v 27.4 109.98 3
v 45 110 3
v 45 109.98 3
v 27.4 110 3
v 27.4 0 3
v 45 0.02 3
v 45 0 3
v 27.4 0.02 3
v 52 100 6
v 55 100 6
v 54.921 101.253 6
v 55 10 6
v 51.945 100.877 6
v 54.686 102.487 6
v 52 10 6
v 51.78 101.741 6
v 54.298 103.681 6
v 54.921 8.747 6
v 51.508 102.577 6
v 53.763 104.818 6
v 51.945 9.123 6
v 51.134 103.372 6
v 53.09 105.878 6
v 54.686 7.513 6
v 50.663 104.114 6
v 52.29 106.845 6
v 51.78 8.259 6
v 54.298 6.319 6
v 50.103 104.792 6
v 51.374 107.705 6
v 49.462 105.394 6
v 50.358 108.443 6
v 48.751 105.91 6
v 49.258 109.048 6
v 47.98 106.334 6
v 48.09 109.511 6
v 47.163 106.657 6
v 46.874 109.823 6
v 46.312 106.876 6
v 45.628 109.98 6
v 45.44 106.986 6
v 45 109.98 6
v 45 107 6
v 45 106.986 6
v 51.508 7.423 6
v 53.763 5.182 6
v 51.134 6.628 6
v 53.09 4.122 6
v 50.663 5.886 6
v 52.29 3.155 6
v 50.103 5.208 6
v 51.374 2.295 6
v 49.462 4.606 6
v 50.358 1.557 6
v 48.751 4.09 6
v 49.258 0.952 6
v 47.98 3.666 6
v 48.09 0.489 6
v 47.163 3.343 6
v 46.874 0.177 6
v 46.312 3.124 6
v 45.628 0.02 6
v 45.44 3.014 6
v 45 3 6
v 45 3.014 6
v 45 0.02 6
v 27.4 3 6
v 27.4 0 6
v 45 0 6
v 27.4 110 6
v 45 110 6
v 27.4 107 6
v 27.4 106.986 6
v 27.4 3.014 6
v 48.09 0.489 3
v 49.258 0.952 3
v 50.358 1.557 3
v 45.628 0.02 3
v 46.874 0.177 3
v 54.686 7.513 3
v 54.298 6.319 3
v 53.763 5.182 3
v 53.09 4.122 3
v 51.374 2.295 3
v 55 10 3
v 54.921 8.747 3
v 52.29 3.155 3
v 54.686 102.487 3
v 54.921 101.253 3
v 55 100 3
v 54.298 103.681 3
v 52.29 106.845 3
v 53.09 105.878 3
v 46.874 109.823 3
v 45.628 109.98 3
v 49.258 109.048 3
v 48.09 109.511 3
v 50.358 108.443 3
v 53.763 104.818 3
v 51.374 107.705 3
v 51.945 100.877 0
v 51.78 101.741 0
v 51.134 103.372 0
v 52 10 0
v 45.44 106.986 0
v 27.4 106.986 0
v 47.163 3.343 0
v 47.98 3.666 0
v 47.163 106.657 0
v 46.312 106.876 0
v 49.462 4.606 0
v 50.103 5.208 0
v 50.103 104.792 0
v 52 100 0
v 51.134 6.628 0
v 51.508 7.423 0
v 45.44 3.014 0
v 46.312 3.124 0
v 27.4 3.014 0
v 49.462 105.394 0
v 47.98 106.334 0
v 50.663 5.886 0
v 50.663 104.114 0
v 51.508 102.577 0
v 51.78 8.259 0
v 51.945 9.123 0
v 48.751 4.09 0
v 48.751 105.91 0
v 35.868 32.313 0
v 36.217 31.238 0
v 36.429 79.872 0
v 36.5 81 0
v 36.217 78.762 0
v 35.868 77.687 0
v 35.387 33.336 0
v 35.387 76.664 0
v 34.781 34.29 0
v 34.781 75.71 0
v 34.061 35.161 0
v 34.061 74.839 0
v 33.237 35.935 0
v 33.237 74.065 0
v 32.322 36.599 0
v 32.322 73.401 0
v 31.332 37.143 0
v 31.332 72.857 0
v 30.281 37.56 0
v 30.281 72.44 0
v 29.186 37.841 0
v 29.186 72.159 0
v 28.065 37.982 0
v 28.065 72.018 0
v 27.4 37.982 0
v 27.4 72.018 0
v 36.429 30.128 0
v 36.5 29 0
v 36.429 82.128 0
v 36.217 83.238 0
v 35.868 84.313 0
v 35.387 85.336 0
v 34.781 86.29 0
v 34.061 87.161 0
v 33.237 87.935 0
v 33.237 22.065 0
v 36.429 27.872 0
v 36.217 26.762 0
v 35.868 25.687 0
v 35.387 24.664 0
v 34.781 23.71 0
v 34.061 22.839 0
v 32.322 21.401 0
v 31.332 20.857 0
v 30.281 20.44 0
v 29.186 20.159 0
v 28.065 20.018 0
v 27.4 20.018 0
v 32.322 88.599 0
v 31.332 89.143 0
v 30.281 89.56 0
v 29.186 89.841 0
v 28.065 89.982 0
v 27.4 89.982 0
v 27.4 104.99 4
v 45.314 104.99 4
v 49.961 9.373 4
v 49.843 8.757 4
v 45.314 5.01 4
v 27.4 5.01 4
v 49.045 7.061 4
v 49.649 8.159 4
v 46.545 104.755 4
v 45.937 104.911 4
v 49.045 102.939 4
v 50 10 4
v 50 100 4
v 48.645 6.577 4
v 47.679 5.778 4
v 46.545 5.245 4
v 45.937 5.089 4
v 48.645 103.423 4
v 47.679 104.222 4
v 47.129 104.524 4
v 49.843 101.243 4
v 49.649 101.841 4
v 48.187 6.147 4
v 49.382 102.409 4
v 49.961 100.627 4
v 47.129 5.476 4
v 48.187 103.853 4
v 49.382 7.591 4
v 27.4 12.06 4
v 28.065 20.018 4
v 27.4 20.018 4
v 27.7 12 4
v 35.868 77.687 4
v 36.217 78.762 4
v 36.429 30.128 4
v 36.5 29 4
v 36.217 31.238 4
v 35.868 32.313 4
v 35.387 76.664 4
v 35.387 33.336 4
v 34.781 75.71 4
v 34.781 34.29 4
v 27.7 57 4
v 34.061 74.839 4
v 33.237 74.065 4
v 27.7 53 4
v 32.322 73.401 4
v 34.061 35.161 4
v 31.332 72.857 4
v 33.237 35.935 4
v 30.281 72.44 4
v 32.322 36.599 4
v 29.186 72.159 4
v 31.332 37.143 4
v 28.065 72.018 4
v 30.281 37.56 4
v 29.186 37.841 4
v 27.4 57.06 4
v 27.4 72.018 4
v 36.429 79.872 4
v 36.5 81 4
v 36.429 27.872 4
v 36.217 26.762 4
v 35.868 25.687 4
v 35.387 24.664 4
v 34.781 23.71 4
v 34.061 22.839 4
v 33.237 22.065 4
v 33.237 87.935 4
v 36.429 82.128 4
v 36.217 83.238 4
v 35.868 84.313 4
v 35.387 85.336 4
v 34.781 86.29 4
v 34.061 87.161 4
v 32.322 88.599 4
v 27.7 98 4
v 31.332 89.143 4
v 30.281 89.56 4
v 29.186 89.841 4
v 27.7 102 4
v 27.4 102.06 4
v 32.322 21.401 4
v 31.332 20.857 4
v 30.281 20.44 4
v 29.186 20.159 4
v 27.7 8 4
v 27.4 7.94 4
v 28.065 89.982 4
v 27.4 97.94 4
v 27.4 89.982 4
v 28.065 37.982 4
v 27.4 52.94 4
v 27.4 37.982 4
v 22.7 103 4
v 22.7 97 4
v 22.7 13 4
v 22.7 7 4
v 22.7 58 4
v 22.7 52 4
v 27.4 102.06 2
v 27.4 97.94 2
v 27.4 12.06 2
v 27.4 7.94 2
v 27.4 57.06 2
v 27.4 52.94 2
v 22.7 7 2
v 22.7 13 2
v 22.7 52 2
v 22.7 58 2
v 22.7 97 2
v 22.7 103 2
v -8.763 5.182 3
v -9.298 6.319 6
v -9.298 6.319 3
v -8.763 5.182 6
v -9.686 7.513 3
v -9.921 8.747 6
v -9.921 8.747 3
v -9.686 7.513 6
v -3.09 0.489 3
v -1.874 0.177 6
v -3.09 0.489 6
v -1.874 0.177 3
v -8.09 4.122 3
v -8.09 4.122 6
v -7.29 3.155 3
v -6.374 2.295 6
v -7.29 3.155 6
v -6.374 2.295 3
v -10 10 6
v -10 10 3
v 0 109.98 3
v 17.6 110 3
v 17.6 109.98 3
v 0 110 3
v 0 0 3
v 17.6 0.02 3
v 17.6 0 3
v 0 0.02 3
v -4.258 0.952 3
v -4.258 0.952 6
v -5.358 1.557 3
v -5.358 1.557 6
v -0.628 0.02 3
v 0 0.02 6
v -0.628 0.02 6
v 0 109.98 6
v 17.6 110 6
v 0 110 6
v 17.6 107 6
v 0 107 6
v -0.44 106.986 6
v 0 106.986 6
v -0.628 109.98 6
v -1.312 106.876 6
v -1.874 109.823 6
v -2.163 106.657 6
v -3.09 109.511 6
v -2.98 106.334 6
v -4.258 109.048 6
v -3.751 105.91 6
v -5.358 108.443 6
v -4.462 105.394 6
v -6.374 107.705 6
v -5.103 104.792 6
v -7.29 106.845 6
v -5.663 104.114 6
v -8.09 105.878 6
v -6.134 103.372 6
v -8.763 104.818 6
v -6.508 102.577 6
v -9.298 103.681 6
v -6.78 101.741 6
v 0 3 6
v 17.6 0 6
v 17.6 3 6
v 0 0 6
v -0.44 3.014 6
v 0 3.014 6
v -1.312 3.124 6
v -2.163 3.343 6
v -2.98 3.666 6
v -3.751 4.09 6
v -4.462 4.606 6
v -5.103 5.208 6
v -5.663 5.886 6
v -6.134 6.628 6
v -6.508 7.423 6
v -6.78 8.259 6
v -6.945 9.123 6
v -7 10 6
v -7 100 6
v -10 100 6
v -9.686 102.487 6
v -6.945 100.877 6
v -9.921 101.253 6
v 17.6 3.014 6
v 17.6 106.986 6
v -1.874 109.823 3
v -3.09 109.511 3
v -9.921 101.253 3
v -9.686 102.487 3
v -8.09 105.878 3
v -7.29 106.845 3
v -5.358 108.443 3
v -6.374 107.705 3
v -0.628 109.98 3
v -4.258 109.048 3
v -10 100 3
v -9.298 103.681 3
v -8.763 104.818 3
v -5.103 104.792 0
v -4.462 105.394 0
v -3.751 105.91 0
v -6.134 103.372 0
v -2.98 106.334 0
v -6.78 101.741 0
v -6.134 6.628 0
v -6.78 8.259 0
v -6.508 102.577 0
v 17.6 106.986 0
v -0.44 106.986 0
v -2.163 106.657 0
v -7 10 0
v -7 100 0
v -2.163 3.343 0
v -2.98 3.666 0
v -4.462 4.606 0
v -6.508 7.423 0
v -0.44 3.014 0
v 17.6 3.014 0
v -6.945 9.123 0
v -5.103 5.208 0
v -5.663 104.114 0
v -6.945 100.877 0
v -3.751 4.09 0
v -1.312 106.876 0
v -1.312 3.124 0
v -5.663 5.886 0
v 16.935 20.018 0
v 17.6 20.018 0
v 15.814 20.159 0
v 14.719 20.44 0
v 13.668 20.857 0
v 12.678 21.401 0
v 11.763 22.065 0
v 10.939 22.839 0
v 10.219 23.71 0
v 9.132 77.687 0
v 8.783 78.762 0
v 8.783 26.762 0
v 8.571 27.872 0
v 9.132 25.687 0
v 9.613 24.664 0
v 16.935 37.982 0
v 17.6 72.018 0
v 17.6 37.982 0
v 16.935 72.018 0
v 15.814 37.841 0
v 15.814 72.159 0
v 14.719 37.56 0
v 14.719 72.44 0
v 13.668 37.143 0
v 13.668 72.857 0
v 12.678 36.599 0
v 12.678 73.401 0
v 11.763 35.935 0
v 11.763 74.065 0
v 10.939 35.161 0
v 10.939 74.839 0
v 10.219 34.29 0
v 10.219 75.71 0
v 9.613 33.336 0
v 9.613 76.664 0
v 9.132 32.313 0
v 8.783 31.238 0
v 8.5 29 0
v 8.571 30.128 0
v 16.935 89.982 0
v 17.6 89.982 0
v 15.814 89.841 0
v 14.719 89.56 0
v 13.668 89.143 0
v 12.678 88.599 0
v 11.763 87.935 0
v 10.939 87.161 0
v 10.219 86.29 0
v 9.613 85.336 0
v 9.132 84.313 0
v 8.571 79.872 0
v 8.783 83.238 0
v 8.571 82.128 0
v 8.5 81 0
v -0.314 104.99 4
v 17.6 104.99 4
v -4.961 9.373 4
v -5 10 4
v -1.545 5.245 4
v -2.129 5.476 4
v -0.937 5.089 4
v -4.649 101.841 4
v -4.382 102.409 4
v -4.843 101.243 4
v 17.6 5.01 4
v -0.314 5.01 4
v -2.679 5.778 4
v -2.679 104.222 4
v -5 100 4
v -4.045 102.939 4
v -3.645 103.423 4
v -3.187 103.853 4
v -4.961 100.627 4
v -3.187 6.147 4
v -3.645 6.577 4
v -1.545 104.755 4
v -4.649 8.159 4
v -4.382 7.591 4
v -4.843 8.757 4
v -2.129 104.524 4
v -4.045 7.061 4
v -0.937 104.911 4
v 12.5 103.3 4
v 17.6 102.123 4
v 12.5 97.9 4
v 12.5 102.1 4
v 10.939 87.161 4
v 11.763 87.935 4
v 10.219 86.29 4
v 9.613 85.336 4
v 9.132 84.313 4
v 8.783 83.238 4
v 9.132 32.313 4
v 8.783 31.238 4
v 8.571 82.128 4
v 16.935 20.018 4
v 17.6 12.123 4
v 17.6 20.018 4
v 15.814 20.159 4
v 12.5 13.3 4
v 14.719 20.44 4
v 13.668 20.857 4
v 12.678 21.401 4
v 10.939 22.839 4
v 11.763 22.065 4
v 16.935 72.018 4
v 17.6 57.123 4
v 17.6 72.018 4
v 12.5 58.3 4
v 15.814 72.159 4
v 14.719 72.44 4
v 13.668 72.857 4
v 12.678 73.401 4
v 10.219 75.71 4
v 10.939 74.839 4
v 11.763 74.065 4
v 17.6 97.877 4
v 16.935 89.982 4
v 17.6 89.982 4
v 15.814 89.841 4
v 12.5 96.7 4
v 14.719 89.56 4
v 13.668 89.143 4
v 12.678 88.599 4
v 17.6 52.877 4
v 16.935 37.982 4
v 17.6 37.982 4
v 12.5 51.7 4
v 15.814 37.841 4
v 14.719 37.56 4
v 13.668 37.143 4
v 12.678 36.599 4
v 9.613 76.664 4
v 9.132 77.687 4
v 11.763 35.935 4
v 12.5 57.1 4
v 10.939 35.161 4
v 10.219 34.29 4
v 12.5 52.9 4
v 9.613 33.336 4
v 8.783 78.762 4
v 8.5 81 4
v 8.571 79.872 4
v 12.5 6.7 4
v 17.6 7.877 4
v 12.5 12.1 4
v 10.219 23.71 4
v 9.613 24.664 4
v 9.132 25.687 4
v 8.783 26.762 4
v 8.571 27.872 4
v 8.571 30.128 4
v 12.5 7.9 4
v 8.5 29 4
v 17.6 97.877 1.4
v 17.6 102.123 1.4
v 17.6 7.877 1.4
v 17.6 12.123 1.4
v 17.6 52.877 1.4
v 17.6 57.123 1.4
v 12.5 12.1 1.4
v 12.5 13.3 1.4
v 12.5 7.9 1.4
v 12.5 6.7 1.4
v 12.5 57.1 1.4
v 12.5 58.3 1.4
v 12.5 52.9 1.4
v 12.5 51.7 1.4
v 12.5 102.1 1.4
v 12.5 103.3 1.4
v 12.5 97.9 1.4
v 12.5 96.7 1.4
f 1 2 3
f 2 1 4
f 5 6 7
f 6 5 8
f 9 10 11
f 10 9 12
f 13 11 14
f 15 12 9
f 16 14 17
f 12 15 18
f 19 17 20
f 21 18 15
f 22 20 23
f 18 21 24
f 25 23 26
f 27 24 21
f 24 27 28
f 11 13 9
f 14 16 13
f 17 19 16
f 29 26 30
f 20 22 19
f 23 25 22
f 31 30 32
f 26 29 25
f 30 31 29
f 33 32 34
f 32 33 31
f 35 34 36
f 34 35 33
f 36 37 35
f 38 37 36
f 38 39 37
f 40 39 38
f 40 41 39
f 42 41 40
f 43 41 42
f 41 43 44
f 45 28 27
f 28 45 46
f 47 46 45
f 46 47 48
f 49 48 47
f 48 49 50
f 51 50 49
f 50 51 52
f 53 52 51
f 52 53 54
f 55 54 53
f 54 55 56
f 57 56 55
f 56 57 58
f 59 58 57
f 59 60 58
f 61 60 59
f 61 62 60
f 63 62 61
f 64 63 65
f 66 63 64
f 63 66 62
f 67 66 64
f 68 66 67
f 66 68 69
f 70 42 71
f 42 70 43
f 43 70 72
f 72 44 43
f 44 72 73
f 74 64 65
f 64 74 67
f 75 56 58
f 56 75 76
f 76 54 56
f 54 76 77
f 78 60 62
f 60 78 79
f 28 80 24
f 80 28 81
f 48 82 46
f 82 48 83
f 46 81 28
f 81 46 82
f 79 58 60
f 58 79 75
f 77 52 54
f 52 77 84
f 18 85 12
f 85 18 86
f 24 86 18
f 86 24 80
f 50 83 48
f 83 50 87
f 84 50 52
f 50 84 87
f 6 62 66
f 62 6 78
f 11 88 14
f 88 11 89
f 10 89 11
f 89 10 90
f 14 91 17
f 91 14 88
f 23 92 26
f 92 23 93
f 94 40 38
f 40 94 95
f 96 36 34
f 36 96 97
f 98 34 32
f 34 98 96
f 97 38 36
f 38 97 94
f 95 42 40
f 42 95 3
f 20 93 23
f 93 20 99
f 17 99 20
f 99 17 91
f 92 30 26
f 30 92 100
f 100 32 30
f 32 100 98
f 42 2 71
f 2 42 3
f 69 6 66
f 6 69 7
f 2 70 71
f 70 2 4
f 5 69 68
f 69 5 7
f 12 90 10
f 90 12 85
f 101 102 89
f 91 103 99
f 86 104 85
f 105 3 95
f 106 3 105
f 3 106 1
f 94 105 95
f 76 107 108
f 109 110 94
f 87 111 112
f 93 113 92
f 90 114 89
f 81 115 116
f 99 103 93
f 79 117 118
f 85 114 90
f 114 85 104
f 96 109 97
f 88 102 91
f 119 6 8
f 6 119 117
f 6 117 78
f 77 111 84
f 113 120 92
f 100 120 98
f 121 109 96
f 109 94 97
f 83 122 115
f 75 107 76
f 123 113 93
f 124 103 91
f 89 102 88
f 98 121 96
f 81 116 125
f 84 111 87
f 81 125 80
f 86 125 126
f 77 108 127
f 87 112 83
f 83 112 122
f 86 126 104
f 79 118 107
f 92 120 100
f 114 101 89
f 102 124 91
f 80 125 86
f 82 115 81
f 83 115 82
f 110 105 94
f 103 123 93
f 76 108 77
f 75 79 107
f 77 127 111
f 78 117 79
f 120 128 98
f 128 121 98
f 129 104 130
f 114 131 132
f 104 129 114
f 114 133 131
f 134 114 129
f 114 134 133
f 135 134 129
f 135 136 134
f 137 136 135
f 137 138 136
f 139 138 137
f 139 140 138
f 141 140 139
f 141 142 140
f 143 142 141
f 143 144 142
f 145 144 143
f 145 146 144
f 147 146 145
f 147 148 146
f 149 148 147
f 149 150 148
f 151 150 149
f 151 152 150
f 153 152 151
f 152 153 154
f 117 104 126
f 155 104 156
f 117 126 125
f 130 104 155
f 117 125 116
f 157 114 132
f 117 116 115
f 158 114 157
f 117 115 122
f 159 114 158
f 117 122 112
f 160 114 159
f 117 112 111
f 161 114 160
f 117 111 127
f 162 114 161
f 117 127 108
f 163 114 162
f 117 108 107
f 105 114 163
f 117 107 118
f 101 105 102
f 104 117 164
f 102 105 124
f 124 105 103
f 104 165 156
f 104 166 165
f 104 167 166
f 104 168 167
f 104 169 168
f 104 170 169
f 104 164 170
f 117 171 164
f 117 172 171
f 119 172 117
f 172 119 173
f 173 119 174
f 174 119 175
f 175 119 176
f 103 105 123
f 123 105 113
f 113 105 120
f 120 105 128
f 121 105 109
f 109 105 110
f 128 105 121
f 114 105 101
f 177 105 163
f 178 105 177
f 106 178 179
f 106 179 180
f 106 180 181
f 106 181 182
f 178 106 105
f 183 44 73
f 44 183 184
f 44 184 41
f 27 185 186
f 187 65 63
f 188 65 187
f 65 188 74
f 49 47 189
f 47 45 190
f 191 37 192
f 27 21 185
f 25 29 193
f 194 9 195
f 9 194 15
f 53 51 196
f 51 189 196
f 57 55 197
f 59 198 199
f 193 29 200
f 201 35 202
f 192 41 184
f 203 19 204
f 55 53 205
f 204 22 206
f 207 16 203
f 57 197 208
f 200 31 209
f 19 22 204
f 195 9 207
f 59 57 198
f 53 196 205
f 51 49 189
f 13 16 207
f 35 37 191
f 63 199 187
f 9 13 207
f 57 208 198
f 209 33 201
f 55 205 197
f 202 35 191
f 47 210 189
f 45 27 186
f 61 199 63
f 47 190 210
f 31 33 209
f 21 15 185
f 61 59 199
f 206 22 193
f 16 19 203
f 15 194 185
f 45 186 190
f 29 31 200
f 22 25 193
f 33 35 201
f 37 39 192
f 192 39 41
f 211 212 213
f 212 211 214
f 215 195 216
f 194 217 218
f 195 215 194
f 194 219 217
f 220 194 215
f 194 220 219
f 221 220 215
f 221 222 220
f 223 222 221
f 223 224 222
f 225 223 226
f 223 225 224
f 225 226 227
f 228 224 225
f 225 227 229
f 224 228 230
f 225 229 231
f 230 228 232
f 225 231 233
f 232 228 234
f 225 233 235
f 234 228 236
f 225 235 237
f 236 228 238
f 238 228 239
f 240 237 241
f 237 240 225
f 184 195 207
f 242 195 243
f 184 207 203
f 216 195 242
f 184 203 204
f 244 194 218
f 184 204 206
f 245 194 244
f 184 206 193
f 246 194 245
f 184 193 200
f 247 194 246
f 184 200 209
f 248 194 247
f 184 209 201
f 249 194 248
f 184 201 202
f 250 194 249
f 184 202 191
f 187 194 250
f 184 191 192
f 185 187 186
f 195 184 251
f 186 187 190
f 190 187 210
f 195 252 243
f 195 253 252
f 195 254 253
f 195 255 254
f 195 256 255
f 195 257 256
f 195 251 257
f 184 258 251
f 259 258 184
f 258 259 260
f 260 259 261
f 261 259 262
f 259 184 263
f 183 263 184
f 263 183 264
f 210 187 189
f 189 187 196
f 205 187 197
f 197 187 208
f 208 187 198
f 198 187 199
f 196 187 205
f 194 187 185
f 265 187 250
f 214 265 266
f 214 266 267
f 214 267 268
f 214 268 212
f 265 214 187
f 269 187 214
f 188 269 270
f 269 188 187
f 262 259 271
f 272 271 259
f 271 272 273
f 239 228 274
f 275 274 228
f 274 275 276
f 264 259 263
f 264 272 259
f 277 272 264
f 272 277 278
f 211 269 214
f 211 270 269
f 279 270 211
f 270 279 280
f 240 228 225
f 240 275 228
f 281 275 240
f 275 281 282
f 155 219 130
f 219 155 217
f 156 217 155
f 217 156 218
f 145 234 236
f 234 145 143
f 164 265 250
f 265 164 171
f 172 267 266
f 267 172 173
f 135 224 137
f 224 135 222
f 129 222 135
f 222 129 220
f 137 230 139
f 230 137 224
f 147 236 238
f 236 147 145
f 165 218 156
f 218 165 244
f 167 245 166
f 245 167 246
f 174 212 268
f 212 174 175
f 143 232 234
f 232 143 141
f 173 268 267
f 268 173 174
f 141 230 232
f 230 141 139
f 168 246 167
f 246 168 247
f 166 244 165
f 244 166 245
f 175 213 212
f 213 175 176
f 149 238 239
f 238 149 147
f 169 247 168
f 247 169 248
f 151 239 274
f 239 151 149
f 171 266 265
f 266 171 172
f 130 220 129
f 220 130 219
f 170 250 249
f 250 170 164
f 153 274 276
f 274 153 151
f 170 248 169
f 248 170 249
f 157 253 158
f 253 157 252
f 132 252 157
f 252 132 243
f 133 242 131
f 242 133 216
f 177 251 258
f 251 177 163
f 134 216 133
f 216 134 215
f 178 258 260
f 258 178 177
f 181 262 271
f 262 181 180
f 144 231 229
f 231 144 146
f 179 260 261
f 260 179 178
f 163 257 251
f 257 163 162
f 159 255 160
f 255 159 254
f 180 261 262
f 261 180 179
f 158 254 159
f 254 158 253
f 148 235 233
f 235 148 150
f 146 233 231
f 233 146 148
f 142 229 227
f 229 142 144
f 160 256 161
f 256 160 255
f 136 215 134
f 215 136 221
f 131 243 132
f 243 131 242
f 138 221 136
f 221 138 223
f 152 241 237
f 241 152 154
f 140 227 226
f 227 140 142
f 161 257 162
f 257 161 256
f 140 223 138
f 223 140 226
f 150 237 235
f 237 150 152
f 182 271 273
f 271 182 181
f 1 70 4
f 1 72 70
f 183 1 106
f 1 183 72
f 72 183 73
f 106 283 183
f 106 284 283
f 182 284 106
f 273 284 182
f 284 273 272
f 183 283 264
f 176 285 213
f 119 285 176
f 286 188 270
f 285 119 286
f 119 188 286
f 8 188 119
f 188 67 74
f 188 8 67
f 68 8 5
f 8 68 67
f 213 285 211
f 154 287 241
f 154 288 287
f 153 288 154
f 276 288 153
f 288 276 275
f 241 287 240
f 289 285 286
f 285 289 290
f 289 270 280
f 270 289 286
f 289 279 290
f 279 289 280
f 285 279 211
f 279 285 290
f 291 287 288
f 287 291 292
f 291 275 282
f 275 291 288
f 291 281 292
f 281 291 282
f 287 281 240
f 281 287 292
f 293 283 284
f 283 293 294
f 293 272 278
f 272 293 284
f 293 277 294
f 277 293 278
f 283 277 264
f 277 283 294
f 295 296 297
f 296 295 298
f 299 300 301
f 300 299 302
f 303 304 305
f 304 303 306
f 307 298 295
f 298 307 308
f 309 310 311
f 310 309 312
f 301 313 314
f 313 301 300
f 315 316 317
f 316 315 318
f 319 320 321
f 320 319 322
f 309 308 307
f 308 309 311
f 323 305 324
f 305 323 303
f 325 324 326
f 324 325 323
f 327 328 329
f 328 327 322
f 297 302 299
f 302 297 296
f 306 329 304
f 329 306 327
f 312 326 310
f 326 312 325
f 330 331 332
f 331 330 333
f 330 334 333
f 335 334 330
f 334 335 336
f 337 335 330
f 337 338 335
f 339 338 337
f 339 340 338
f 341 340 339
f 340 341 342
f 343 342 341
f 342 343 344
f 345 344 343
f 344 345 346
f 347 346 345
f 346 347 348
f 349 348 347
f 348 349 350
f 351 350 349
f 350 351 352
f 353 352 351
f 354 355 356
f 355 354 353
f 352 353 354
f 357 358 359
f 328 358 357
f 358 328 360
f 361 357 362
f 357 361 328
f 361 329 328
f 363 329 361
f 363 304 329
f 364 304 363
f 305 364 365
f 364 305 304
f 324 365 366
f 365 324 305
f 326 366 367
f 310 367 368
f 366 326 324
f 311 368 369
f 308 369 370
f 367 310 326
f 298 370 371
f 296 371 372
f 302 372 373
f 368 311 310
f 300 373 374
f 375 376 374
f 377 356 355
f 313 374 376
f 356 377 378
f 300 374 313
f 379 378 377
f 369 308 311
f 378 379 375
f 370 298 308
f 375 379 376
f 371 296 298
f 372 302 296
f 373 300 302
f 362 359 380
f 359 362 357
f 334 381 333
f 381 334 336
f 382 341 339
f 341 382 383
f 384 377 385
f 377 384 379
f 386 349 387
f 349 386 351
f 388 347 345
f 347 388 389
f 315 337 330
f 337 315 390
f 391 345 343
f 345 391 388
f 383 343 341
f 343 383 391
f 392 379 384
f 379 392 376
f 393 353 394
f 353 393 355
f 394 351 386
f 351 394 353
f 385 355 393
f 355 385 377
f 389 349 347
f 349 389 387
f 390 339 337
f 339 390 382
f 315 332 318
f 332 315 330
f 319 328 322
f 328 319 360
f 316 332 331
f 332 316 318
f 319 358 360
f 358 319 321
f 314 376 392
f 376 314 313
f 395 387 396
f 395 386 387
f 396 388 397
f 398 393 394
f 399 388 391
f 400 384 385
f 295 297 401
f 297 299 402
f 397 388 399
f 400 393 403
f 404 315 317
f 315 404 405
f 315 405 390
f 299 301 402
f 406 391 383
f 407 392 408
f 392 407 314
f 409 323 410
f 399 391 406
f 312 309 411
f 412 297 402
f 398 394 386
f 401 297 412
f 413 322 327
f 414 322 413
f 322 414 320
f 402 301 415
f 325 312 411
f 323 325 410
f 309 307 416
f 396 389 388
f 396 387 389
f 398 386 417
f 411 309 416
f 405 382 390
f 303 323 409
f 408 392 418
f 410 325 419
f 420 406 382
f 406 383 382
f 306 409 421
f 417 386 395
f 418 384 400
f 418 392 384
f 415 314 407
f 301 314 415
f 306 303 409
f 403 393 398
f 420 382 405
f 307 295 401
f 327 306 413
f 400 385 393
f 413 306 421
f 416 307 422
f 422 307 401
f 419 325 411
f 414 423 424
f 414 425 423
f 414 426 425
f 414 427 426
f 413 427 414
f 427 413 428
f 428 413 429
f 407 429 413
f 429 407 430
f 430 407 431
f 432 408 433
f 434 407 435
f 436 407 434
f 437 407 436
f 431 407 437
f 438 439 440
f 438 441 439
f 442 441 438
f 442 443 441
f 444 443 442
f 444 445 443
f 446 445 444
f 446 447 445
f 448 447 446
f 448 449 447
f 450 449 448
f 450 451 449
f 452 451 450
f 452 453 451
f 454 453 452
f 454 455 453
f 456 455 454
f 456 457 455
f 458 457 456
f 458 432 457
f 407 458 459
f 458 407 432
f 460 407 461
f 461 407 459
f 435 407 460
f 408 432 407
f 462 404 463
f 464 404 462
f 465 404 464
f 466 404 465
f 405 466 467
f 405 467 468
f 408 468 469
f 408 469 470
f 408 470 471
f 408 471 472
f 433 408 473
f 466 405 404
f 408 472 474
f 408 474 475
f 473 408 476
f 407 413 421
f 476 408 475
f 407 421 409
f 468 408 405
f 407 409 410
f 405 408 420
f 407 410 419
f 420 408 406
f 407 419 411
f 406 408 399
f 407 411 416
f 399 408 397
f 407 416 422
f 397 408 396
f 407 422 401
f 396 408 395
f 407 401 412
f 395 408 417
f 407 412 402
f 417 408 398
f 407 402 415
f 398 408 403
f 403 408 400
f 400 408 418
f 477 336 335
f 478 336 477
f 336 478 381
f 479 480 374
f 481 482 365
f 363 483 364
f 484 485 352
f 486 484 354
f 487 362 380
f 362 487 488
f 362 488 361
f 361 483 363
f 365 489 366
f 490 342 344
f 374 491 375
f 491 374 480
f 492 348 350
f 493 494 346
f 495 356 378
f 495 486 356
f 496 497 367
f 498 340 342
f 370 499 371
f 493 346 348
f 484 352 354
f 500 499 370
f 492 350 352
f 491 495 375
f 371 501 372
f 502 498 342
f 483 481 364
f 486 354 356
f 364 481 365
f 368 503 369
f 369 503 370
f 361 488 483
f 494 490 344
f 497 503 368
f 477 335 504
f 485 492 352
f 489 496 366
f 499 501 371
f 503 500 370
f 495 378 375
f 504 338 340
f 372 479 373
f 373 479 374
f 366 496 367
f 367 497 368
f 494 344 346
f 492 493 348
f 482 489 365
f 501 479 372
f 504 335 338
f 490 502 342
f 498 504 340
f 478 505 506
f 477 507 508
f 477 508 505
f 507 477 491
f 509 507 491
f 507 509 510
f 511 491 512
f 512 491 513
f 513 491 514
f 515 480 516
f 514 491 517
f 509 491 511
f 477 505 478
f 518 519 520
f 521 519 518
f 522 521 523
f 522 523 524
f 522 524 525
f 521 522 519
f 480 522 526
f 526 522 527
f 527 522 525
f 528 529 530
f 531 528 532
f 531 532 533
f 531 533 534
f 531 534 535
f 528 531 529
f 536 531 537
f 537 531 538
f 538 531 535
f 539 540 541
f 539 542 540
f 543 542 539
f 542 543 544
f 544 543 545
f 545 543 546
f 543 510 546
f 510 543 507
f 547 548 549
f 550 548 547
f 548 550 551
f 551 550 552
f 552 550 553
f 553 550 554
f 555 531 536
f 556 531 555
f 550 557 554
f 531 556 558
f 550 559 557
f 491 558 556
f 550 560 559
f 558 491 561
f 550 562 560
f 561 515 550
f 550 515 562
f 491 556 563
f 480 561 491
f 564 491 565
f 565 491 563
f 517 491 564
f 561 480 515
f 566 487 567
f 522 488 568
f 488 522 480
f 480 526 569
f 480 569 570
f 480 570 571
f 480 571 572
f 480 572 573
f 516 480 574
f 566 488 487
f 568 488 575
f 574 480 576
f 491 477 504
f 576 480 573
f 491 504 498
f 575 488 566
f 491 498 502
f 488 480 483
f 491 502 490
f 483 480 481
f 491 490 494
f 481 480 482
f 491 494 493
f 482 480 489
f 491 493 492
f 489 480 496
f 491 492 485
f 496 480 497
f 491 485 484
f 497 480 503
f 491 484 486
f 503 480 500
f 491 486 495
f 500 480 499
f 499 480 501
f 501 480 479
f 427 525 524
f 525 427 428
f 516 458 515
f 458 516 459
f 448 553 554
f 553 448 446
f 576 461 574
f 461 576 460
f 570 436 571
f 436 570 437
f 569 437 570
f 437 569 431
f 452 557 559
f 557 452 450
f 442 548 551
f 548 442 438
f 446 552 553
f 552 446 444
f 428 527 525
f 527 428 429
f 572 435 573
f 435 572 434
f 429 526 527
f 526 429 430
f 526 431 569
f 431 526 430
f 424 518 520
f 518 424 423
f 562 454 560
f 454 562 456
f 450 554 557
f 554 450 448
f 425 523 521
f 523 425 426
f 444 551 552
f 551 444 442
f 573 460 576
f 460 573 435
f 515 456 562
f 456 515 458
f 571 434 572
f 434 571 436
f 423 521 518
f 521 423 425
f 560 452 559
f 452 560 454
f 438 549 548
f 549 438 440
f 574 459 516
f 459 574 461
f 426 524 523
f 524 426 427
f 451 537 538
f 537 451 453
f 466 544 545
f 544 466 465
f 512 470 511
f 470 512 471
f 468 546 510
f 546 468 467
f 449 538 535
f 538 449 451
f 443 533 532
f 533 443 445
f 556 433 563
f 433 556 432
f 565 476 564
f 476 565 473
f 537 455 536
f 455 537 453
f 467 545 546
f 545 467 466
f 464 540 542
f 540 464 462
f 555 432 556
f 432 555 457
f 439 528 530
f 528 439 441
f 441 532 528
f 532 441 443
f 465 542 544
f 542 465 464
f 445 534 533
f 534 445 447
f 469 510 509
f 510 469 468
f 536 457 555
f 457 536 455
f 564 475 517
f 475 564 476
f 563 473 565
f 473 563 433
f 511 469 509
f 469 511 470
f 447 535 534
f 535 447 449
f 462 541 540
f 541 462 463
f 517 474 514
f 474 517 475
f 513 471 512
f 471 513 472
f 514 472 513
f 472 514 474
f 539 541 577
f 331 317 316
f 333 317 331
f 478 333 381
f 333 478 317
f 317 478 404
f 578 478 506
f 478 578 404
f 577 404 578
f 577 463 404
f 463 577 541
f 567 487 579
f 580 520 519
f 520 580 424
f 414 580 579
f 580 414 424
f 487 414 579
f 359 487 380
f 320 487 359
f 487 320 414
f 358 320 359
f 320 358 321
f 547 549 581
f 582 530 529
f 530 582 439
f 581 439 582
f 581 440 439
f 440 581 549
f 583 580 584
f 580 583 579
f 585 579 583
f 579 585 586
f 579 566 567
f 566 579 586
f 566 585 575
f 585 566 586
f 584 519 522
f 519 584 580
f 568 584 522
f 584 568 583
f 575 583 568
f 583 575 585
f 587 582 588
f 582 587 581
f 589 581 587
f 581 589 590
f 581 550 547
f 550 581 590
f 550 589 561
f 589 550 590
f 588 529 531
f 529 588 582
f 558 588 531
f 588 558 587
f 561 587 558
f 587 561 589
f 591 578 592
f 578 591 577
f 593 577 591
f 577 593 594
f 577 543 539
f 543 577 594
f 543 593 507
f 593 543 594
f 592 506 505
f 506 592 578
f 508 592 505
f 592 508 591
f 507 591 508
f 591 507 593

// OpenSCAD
// file: toilet_ground_floor_config.scad
use <./_cfg.scad>

// Toilet Ground Floor Configuration Functions
function get_h() = 6;
function get_width() = 55;
function get_length() = 110;
function get_diameter() = 18;
function get_distance() = 52;
function get_nutDistance() = 10;
function get_separation() = 10;
function get_offset_l() = 0;
function get_offset_r() = 0;
// file: _cfg.scad
// Global configuration functions
function get_fn() = 50;
function get_darft() = false;
// file: base.scad
module base(h, width, length, diameter, distance, offset_l=0, offset_r=0, fn) {
    corner_radius=10;

    difference() {
        union() {
            difference() {
                _base_plate_shape(corner_radius, h, width, length, fn);
                translate([3,3,h-2]) {
                    offset=3;
                    _base_plate_shape(corner_radius-offset, h-2, width-offset*2, length-offset*2, fn);
                }
            }
        }

        translate([width/2, length/2-distance/2, -.1]) {
            translate([offset_l, 0, 0])
            cylinder(d=diameter, h=h+.2, center=false, $fn=fn);
            translate([offset_r, distance, 0]) {
                cylinder(d=diameter, h=h+.2, center=false, $fn=fn);
            }
        }
    }
}

module rounded_top_only(corner_radius, h, width, length, fn) {
    minkowski() {
        _base_plate_shape(corner_radius, h - corner_radius, width, length, fn);
        translate([0, 0, corner_radius]) cylinder(r=corner_radius/2, h=0.001, $fn=fn);
    }
}

module _base_plate_shape(corner_radius, h, width, length, fn) {
    hs=h/2;
    hn=h-hs;

    translate([0, 0, hs])

    union() {
        translate([corner_radius, 0, 0])
            cube([width - corner_radius * 2, length, hn], center=false);

        translate([0, corner_radius, 0])
            cube([width, length - corner_radius * 2, hn], center=false);

        for (x = [corner_radius, width - corner_radius])
        for (y = [corner_radius, length - corner_radius])
        translate([x, y, 0])
            cylinder(d = corner_radius * 2, h = hn, center = false, $fn = fn);

        // -------

        hull() {
            for (x = [corner_radius, width - corner_radius])
            for (y = [corner_radius, length - corner_radius])
            translate([x, y, 0])
                translate([0, 0, -hs])
                    cylinder(r1=corner_radius-hs, r2=corner_radius, h = hs, center = false, $fn = fn);
        }
    }
}

module nut(h,extend=0) {
    nut_height=h;
    nut_width=5+extend;
    nut_length=4+extend;
    nut_length_=1+extend;
    rotate([0,0,90]) {
        translate([-nut_length/2,0,0]) {
            linear_extrude(height=nut_height)
                polygon(points=[[0,0], [-nut_length_,nut_width], [0,nut_width]]);

            translate([nut_length,0,0]) {
                linear_extrude(height=nut_height)
                    polygon(points=[[0,0], [nut_length_,nut_width], [0,nut_width]]);
            }

            cube([nut_length, nut_width, nut_height], center=false);
        }
    }
}

module both(h, width, length, diameter, distance, nutDistance, separation, offset_l=0, offset_r=0, fn) {
    left(h, width, length, diameter, distance, nutDistance, offset_l, offset_r, fn);

    translate([-separation, 0, 0])
        right(h, width, length, diameter, distance, nutDistance, offset_l, offset_r, fn);
}

module left(h, width, length, diameter, distance, nutDistance, offset_l=0, offset_r=0, fn) {
    union() {
        translate([0, 0, 0]) {
            difference() {
                base(h, width, length, diameter, distance, offset_l, offset_r, fn);
                translate([-.1, -.1, -.1]) {
                    cube([width / 2, length + .2, h + .2], center = false);
                }
            }
        }

        translate([0.2,0,2])
            translate([width / 2, 0, 0]) {
                translate([0, nutDistance, 0]) {
                    nut(h - 4);
                }
                translate([0, length / 2, 0]) {
                    nut(h - 4);
                }
                translate([0, length - nutDistance, 0]) {
                    nut(h - 4);
                }
            }
    }
}

module right(h, width, length, diameter, distance, nutDistance, offset_l=0, offset_r=0, fn) {
    difference() {
        union() {
            difference() {
                base(h, width, length, diameter, distance, offset_l, offset_r, fn);
                translate([width / 2 + .1, -.1, -.1]) {
                    cube([width / 2, length + .2, h + .2], center = false);
                }
            }
        }

        translate([0.2,0,1.5])
            translate([width / 2 , 0, -.1]) {
                translate([0, nutDistance, 0]) {
                    nut(h - 1.3, extend = .2);
                }
                translate([0, length / 2, 0]) {
                    nut(h - 1.3, extend = .2);
                }
                translate([0, length - nutDistance, 0]) {
                    nut(h - 1.3, extend =  .2);
                }
            }
    }
}
// main file
use <./base.scad>
use <./_cfg.scad>
use <./toilet_ground_floor_config.scad>

both(h=get_h(),
width=get_width(),
length=get_length(),
diameter=get_diameter(),
distance=get_distance(),
nutDistance=get_nutDistance(),
separation=get_separation(),
offset_l=get_offset_l(),
offset_r=get_offset_r(),
fn=get_fn()
);
